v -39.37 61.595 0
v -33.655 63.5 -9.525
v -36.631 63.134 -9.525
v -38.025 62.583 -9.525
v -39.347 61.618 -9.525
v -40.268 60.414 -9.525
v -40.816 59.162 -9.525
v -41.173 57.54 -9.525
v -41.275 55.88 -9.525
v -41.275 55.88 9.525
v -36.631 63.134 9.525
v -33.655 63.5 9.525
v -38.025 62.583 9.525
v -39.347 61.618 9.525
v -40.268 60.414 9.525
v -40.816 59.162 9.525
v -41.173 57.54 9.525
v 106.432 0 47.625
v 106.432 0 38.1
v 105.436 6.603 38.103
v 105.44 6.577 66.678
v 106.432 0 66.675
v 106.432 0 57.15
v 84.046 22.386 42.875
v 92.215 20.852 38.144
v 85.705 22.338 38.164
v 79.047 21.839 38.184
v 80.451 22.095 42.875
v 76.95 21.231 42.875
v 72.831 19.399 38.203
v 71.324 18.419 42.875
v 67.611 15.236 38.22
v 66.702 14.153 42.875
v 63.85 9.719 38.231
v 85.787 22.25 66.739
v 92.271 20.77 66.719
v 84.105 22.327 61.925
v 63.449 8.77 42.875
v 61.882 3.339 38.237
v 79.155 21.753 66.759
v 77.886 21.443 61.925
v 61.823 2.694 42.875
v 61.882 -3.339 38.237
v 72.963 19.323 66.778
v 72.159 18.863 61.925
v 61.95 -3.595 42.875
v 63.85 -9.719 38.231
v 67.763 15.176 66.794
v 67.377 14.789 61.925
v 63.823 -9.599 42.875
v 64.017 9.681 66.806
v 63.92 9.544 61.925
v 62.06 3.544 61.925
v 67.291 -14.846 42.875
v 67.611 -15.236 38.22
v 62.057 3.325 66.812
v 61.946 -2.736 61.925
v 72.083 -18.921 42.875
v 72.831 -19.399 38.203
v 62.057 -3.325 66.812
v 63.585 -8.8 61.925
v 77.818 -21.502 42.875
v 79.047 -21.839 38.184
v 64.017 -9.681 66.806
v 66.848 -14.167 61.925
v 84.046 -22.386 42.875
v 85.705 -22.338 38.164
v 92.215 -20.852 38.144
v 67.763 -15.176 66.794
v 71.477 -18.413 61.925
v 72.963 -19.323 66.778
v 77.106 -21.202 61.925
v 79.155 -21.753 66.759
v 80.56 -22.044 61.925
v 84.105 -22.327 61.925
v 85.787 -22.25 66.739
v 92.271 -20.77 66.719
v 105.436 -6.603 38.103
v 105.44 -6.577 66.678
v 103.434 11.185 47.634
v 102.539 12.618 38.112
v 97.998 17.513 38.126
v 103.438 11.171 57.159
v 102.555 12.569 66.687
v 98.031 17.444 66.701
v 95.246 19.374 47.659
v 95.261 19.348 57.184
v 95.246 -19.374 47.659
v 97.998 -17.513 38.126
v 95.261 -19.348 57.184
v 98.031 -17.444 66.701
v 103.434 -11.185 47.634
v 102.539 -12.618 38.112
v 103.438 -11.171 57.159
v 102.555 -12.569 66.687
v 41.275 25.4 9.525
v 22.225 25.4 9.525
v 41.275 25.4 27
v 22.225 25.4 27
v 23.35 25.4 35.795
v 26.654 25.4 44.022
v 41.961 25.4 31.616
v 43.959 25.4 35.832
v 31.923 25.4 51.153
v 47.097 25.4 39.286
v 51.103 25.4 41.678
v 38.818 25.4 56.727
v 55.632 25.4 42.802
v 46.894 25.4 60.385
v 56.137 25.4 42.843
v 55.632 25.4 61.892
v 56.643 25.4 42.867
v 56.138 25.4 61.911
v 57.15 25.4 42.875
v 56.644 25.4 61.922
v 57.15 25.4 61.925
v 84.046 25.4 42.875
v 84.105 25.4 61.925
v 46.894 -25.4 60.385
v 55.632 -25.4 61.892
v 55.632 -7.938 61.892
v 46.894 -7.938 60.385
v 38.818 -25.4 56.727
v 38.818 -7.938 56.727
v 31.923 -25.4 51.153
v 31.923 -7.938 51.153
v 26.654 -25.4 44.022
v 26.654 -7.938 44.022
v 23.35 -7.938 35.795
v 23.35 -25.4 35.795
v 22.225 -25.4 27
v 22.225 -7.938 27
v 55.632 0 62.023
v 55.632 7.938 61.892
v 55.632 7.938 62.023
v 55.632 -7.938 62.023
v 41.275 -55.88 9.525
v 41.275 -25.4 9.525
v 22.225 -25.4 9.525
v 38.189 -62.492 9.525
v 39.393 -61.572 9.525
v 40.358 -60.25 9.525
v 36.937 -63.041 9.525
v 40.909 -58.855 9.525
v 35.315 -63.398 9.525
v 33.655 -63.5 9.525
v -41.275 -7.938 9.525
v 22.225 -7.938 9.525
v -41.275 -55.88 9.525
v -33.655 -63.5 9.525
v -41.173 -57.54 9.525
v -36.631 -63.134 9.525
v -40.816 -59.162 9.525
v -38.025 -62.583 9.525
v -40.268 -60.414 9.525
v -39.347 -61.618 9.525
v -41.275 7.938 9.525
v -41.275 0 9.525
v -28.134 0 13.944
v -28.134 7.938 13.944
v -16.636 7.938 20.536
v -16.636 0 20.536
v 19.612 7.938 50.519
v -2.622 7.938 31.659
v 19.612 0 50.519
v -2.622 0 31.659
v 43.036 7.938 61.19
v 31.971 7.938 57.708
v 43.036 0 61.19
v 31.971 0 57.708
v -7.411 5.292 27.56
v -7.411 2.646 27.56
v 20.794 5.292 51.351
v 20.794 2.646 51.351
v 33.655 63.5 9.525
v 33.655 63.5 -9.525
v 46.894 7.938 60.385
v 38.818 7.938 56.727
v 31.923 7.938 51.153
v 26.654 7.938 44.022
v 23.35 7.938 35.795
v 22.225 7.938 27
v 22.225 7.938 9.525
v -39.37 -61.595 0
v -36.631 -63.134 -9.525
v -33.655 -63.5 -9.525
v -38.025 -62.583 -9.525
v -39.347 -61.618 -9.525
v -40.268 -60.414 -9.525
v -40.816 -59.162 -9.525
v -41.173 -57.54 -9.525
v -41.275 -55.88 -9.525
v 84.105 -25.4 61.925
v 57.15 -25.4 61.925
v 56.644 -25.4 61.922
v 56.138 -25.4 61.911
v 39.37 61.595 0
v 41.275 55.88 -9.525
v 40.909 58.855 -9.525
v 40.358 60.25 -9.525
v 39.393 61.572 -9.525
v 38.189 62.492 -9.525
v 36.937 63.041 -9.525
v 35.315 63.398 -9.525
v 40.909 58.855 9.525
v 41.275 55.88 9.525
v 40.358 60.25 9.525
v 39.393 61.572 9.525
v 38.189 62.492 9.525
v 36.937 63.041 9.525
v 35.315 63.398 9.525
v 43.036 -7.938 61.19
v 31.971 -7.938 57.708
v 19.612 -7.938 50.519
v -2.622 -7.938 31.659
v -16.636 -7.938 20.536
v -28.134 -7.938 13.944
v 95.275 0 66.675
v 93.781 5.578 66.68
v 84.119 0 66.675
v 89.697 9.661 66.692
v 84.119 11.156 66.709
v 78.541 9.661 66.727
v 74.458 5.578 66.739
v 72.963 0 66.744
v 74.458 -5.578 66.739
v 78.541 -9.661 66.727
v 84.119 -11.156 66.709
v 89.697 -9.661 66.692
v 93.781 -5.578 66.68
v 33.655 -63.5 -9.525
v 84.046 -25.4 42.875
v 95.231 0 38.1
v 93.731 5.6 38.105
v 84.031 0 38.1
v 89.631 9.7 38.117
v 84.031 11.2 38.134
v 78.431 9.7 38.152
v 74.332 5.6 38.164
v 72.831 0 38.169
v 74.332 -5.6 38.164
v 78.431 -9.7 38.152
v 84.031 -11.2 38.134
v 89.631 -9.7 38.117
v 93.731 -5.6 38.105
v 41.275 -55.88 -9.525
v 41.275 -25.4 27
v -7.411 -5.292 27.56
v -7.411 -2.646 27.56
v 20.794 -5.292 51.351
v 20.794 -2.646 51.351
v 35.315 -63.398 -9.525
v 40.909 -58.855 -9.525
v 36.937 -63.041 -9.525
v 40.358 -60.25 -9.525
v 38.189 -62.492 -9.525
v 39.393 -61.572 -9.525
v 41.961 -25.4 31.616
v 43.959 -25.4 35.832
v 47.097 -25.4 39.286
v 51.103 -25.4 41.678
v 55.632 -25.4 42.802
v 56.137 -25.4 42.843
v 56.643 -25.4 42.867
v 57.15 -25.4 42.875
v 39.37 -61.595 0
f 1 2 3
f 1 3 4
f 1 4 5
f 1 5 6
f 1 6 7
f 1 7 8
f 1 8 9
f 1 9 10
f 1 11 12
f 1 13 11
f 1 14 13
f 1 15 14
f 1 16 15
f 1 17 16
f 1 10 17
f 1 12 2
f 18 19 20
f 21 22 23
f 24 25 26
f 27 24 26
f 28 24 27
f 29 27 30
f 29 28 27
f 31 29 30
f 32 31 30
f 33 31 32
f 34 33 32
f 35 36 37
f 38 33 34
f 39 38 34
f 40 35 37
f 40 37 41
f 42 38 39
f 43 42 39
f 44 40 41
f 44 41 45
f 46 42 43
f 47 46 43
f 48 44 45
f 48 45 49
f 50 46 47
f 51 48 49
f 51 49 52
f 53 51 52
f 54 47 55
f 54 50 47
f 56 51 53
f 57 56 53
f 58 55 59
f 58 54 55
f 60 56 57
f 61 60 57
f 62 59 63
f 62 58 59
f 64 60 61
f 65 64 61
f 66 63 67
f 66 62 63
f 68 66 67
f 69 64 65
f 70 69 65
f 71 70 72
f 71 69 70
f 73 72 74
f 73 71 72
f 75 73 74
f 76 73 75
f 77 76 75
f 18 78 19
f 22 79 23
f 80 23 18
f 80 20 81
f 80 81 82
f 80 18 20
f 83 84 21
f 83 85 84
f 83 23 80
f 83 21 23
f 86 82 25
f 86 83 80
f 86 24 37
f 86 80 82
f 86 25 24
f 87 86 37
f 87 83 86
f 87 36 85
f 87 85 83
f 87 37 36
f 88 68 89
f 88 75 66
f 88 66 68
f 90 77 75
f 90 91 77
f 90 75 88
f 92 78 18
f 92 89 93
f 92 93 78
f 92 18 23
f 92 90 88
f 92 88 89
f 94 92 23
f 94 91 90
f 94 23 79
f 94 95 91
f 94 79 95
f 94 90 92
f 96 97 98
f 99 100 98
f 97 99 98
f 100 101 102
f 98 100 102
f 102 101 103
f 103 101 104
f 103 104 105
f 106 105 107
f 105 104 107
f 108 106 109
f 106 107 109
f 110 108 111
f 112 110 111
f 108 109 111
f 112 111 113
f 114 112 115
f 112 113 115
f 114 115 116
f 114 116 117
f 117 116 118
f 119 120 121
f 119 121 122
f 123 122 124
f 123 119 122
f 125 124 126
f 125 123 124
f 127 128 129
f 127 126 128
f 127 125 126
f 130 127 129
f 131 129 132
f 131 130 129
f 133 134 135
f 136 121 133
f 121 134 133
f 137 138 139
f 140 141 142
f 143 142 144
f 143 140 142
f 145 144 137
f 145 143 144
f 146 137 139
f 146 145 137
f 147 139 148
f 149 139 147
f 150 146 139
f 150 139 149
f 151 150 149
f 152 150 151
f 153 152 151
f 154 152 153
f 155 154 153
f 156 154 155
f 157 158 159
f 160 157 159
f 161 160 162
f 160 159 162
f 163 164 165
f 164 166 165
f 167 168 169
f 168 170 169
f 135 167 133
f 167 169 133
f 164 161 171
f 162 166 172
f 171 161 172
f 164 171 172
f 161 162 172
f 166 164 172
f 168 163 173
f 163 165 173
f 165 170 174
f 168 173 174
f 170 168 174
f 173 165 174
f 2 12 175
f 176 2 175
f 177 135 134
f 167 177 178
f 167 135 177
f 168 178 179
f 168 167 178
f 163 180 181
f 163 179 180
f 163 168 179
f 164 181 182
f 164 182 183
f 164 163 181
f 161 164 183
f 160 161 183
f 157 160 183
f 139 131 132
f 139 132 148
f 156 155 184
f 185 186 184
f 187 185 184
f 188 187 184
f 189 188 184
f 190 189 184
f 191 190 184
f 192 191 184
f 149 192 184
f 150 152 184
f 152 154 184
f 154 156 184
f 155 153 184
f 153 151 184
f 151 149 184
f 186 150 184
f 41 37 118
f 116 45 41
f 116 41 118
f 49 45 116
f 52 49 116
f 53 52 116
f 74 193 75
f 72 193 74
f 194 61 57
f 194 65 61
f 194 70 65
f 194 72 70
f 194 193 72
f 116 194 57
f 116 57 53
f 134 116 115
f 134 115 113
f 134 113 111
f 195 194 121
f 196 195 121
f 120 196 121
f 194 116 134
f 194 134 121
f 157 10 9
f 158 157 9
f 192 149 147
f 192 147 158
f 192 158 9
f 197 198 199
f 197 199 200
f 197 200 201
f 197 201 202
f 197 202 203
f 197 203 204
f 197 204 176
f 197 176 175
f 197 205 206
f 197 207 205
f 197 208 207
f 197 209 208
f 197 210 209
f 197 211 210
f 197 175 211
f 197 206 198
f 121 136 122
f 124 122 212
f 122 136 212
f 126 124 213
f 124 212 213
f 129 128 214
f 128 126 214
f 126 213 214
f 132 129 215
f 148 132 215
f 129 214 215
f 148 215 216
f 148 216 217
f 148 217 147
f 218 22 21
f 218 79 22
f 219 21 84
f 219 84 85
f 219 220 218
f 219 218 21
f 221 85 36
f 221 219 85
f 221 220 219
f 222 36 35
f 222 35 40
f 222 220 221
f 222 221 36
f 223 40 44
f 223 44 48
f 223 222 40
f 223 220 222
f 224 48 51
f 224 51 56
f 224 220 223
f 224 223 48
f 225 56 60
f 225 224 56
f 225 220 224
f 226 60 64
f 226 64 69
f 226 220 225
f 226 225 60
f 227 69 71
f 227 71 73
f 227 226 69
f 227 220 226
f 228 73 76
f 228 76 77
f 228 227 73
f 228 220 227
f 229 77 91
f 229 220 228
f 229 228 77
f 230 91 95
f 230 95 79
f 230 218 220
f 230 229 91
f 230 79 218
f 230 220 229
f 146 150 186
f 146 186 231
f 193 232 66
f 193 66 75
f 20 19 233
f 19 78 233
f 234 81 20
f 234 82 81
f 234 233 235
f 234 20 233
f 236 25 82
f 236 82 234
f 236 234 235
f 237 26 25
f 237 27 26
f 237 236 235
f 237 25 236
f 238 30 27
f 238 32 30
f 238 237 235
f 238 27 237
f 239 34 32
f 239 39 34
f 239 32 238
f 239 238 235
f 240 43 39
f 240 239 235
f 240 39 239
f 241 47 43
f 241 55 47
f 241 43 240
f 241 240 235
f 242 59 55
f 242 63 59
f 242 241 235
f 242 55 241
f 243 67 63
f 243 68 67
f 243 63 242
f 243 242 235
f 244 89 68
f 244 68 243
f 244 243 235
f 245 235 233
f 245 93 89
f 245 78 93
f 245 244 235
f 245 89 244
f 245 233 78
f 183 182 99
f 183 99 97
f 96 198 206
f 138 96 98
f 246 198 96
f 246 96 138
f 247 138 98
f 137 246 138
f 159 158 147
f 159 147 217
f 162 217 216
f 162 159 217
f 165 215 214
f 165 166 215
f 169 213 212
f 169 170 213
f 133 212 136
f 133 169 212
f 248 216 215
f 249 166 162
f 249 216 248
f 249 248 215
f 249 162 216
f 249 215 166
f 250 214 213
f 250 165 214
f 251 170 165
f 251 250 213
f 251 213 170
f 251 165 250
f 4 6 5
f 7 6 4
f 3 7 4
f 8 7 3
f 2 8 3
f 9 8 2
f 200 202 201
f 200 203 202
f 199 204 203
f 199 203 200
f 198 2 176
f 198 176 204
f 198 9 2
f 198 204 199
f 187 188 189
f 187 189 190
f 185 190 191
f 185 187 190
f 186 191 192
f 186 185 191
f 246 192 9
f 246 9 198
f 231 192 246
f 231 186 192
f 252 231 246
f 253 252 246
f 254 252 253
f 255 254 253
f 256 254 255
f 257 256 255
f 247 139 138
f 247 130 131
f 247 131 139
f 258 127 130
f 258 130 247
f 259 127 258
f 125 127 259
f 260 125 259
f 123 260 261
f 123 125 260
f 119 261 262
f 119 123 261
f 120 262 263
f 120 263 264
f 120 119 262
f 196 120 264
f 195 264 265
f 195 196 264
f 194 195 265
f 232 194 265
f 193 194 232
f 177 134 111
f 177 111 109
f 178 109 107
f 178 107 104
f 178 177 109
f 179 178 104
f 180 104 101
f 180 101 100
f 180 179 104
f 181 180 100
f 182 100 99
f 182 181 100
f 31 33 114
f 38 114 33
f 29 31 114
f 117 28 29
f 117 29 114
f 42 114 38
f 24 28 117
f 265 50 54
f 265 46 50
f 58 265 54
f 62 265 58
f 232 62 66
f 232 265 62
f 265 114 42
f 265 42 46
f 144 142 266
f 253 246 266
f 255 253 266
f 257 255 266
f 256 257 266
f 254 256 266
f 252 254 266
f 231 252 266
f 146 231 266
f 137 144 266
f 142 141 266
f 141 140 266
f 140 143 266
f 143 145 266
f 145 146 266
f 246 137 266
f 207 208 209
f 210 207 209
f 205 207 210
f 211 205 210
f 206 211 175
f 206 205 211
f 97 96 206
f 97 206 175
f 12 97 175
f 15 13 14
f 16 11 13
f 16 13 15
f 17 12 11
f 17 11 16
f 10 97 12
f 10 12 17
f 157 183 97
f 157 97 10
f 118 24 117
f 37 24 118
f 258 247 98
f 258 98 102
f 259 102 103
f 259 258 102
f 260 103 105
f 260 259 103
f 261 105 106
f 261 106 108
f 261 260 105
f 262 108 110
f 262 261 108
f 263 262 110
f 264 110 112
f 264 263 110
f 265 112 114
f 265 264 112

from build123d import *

# Parameters (mm, degrees)
F1_DEPTH    = 63.5
F2_DEPTH    = 25.4
F3_DEPTH    = 7.9375
F5_T1_DEPTH = 57.15


# Not quite as in the source:
# - a fillet or chamfer that OpenCascade refuses, or shapes differently, is made with other operations: its cross-section is extruded or revolved along the edge and cut away or added


with BuildPart() as f1:
    # F0 (on Front) → F1 (new body, symmetric)
    with BuildSketch(Plane.XZ):
        Polygon((-41.275, 9.525), (-41.275, -9.525), (41.275, -9.525), (41.275, 9.525), (22.225, 9.525), align=None)
    extrude(amount=F1_DEPTH, both=True)

    # F0 (on Front) → F2 (join, symmetric)
    with BuildSketch(Plane.XZ):
        with BuildLine():
            Line((22.225, 9.525), (41.275, 9.525))
            Line((41.275, 9.525), (41.275, 27.0002))
            ThreePointArc((41.275, 27.0002), (45.4000764986, 37.6751671059), (55.631525696, 42.8024106298))
            Line((55.631525696, 42.8024106298), (55.631525696, 61.8921741601))
            ThreePointArc((55.631525696, 61.8921741601), (31.9231458554, 51.1530767431), (22.225, 27.0002))
            Line((22.225, 27.0002), (22.225, 9.525))
        make_face()
        with BuildLine():
            ThreePointArc((57.15, 61.9252), (56.3905832965, 61.9169425639), (55.631525696, 61.8921741601))
            Line((55.631525696, 61.8921741601), (55.631525696, 42.8024106298))
            ThreePointArc((55.631525696, 42.8024106298), (56.3898910433, 42.8569922158), (57.15, 42.8752))
            Line((57.15, 42.8752), (84.0459217609, 42.8752))
            Line((84.0459217609, 42.8752), (84.1045851677, 61.9252))
            Line((84.1045851677, 61.9252), (57.15, 61.9252))
        make_face()
    extrude(amount=F2_DEPTH, both=True)

    # F0 (on Front) → F3 (join, symmetric)
    with BuildSketch(Plane.XZ):
        with BuildLine():
            add(Edge.make_bspline(
                [(-41.275, 9.525), (-0.4847672351, 18.3894253248), (13.3813129593, 64.201731175), (55.631525696, 62.0233434816)],
                knots=[0, 0, 0, 0, 110.1949360256, 110.1949360256, 110.1949360256, 110.1949360256], degree=3))
            Line((-41.275, 9.525), (22.225, 9.525))
            Line((22.225, 9.525), (22.225, 27.0002))
            ThreePointArc((22.225, 27.0002), (31.9231458554, 51.1530767431), (55.631525696, 61.8921741601))
            Line((55.631525696, 61.8921741601), (55.631525696, 62.0233434816))
        make_face()
    extrude(amount=F3_DEPTH, both=True)

    # F0 (on Front) → F4 (revolve)
    with BuildSketch(Plane.XZ):
        Polygon((106.431525696, 66.675), (84.1192119104, 66.675), (84.1045851677, 61.9252), (84.0459217609, 42.8752), (84.0312168002, 38.1), (106.431525696, 38.1), align=None)
    revolve(axis=Axis((84.0752143553, 0, 52.3875), (0.0030794293, 0, 0.9999952585)))

    # F5: fillet of radius 7.62 on 4 edges, made by hand

    # F5_s2 → F5_t1 (cut)
    with BuildSketch(Plane.XY.offset(-28.575)):
        with BuildLine():
            add(Edge.make_bspline(
                [(-41.275, -55.88), (-41.275, -63.5), (-33.655, -63.5)],
                knots=[0, 0, 0, 1, 1, 1], degree=2, weights=[1, 1, 1]))
            Line((-33.655, -63.5), (-41.275, -63.5))
            Line((-41.275, -63.5), (-41.275, -55.88))
        make_face()
        with BuildLine():
            add(Edge.make_bspline(
                [(33.655, -63.5), (41.275, -63.5), (41.275, -55.88)],
                knots=[0, 0, 0, 1, 1, 1], degree=2, weights=[1, 1, 1]))
            Line((41.275, -55.88), (41.275, -63.5))
            Line((41.275, -63.5), (33.655, -63.5))
        make_face()
        with BuildLine():
            add(Edge.make_bspline(
                [(-41.275, 55.88), (-41.275, 63.5), (-33.655, 63.5)],
                knots=[0, 0, 0, 1, 1, 1], degree=2, weights=[1, 1, 1]))
            Line((-33.655, 63.5), (-41.275, 63.5))
            Line((-41.275, 63.5), (-41.275, 55.88))
        make_face()
        with BuildLine():
            add(Edge.make_bspline(
                [(33.655, 63.5), (41.275, 63.5), (41.275, 55.88)],
                knots=[0, 0, 0, 1, 1, 1], degree=2, weights=[1, 1, 1]))
            Line((41.275, 55.88), (41.275, 63.5))
            Line((41.275, 63.5), (33.655, 63.5))
        make_face()
    extrude(amount=F5_T1_DEPTH, mode=Mode.SUBTRACT)


solid = f1.part
